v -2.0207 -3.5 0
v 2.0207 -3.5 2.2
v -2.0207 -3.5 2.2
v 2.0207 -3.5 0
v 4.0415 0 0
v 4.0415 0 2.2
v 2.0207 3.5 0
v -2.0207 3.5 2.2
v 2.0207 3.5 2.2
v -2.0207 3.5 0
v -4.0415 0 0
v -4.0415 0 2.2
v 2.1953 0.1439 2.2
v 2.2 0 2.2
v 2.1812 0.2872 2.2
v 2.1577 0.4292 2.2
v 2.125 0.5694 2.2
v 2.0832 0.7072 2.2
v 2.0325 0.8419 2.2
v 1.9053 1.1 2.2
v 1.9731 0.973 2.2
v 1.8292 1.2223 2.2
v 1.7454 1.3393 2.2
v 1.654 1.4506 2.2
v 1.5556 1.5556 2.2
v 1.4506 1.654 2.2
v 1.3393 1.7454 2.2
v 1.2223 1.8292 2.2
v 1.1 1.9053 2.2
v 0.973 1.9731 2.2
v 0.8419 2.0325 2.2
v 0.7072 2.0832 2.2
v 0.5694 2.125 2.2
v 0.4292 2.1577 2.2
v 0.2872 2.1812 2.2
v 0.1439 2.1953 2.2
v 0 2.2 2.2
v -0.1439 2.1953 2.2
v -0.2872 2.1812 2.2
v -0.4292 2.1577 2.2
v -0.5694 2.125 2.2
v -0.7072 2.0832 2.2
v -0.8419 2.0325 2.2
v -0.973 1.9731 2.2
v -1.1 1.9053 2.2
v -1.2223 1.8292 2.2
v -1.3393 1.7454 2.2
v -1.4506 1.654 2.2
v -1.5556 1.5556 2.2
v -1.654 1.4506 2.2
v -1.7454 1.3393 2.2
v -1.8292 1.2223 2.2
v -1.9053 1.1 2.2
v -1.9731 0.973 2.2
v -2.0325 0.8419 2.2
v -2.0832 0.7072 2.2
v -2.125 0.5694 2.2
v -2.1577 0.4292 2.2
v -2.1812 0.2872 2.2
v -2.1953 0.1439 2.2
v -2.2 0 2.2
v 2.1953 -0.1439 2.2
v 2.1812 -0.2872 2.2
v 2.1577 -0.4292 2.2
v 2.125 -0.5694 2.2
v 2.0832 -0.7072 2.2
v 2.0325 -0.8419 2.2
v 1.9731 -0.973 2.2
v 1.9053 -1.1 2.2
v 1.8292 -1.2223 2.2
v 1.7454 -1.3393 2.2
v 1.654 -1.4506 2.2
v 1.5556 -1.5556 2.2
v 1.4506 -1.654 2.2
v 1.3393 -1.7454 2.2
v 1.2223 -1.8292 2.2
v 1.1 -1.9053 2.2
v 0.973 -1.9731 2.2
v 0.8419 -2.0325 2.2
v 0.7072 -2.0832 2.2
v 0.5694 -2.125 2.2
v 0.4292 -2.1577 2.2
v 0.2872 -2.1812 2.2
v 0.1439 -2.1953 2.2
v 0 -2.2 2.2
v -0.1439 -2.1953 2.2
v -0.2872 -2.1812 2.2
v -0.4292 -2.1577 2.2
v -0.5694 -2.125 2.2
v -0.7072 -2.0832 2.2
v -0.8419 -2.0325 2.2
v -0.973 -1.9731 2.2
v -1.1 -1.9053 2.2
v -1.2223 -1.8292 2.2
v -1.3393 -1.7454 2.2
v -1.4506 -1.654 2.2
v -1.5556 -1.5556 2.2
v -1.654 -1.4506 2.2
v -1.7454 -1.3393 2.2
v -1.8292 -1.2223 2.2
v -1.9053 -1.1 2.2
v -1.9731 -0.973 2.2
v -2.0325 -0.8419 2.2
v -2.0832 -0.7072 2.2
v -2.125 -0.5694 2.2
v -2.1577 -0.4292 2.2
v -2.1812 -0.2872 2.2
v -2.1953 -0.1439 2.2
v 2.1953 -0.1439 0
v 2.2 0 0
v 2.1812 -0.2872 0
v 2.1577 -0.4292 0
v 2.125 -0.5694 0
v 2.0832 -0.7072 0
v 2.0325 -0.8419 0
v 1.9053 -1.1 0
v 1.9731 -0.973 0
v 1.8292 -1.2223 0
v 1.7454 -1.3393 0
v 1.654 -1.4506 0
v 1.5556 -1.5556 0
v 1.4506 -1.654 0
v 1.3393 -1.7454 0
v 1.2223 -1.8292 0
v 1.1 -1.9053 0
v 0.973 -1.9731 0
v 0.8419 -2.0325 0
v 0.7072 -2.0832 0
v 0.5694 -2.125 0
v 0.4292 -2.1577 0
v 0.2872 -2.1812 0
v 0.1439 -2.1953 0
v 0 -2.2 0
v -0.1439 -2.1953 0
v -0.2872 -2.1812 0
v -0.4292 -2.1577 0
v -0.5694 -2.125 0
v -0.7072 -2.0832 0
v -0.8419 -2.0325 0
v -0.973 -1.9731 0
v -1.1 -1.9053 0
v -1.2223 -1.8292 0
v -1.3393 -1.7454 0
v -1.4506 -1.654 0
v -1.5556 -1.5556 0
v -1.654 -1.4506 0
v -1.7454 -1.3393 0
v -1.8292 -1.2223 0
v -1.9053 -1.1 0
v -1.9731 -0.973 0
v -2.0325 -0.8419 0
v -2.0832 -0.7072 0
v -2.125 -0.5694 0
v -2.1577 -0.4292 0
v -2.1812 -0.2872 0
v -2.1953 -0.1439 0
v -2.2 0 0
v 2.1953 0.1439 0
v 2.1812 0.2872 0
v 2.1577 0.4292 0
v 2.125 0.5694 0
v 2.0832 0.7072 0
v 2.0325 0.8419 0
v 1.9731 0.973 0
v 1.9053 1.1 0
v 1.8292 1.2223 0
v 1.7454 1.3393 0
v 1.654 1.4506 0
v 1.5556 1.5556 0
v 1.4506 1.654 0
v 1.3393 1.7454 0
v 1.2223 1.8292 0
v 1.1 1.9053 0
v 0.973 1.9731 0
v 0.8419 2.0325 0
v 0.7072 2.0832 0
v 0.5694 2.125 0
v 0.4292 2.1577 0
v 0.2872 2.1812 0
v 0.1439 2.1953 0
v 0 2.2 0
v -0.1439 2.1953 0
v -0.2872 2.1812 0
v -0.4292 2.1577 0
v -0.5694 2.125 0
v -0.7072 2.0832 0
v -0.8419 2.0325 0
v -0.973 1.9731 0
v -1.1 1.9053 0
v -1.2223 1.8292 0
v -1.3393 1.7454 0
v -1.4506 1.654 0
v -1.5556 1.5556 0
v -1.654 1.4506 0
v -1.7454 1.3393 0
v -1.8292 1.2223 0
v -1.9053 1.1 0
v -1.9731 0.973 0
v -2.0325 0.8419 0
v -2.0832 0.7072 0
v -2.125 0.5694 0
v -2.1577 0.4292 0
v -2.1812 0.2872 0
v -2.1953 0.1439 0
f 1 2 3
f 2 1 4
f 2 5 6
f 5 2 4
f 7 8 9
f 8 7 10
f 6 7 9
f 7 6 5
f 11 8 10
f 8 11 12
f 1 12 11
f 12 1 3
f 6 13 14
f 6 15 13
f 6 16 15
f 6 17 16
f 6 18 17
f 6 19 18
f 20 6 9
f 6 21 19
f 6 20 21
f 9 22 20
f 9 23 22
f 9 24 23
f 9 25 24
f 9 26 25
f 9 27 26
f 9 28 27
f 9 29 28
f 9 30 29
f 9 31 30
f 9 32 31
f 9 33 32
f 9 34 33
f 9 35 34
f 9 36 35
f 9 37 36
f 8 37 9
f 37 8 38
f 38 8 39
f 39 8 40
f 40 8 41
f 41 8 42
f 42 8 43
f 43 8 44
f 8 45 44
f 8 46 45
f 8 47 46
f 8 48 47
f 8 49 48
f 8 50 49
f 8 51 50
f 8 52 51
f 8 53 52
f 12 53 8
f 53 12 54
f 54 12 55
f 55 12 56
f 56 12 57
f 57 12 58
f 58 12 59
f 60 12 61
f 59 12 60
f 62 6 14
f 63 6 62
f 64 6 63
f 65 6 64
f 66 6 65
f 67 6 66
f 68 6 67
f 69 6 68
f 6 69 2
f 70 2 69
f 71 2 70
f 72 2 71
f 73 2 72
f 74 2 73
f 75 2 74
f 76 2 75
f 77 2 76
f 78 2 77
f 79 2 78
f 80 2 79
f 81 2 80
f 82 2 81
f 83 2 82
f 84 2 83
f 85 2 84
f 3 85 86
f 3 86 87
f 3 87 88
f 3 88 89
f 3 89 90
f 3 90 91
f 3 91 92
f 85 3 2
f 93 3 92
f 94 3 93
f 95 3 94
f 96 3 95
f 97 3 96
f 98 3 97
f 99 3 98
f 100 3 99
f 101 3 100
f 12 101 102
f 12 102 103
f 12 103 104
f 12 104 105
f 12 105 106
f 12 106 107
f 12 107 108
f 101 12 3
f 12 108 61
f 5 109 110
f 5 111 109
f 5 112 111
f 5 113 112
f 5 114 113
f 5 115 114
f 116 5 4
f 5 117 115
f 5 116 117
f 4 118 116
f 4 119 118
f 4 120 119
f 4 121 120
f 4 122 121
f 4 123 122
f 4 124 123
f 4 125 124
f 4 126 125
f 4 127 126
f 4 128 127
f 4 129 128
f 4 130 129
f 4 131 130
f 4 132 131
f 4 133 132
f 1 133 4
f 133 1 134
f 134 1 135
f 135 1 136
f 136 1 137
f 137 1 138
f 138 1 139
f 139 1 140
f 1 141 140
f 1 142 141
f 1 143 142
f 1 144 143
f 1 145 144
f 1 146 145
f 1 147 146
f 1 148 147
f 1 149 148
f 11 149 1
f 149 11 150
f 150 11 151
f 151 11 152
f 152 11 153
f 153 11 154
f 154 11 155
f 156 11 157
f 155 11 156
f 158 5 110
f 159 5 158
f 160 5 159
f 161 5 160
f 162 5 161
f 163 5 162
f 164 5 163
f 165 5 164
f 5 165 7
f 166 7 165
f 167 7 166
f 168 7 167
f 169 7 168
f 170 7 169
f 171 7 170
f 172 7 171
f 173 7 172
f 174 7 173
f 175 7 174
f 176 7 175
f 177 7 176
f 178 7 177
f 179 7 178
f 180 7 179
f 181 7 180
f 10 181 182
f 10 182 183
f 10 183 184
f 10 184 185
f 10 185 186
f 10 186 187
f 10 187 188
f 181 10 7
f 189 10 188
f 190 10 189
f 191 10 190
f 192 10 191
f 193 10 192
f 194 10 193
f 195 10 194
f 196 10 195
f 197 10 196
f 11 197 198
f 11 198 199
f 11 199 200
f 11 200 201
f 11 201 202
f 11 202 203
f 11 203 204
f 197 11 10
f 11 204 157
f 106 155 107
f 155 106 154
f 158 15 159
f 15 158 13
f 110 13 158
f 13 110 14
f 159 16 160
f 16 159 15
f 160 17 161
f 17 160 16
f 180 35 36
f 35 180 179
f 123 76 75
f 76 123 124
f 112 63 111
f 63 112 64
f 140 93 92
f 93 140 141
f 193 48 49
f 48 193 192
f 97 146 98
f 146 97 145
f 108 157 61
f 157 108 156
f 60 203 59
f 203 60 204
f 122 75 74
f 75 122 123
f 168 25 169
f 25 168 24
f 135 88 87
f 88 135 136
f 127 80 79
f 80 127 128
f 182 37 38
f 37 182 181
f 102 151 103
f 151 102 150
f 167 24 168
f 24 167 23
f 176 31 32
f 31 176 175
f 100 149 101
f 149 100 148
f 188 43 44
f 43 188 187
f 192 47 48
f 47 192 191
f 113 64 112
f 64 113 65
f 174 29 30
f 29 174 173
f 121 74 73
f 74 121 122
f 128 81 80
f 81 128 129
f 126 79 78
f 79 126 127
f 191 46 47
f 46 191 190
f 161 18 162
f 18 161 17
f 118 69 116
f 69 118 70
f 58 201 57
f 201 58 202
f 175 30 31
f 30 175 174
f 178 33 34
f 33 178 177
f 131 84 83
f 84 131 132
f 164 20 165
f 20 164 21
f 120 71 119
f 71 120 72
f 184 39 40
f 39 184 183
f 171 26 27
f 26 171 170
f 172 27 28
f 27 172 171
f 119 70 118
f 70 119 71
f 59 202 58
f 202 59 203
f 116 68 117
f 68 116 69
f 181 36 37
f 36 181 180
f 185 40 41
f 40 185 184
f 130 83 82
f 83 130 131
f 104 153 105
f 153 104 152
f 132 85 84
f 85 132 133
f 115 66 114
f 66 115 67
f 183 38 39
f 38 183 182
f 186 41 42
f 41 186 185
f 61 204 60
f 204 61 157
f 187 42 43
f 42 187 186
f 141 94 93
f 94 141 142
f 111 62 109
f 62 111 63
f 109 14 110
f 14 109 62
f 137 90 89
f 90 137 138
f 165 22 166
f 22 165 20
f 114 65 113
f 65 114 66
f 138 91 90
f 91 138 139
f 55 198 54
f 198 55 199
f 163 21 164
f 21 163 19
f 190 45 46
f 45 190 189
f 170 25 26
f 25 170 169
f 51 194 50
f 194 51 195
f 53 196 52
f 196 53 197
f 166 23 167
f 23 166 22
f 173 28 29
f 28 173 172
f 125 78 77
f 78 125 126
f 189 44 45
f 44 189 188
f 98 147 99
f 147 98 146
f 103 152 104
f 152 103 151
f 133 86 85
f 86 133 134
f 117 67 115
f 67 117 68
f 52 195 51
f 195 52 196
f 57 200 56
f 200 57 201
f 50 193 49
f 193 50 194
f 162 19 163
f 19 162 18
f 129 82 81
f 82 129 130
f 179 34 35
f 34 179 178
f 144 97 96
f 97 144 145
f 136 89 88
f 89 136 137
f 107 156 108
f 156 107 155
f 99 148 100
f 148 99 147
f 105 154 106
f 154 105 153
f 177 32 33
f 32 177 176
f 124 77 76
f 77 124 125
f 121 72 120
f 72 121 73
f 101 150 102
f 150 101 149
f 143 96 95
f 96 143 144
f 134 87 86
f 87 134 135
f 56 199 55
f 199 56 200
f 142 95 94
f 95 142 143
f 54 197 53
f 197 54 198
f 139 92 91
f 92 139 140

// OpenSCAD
$fn = 96;

screw_d = 4.0;          // nominal screw diameter (mm)
clearance = 0.4;        // typical clearance for M4-ish hole (mm)
hole_d = screw_d + clearance;

across_flats = 7.0;     // mm
thickness = 2.2;        // mm

module hex_prism_af(af, h) {
    // For a regular hexagon: across flats = 2 * apothem
    // Circumradius R = af / sqrt(3)
    R = af / sqrt(3);
    cylinder(h = h, r = R, $fn = 6);
}

difference() {
    hex_prism_af(across_flats, thickness);
    translate([0, 0, -0.2])
        cylinder(h = thickness + 0.4, d = hole_d, $fn = 96);
}
